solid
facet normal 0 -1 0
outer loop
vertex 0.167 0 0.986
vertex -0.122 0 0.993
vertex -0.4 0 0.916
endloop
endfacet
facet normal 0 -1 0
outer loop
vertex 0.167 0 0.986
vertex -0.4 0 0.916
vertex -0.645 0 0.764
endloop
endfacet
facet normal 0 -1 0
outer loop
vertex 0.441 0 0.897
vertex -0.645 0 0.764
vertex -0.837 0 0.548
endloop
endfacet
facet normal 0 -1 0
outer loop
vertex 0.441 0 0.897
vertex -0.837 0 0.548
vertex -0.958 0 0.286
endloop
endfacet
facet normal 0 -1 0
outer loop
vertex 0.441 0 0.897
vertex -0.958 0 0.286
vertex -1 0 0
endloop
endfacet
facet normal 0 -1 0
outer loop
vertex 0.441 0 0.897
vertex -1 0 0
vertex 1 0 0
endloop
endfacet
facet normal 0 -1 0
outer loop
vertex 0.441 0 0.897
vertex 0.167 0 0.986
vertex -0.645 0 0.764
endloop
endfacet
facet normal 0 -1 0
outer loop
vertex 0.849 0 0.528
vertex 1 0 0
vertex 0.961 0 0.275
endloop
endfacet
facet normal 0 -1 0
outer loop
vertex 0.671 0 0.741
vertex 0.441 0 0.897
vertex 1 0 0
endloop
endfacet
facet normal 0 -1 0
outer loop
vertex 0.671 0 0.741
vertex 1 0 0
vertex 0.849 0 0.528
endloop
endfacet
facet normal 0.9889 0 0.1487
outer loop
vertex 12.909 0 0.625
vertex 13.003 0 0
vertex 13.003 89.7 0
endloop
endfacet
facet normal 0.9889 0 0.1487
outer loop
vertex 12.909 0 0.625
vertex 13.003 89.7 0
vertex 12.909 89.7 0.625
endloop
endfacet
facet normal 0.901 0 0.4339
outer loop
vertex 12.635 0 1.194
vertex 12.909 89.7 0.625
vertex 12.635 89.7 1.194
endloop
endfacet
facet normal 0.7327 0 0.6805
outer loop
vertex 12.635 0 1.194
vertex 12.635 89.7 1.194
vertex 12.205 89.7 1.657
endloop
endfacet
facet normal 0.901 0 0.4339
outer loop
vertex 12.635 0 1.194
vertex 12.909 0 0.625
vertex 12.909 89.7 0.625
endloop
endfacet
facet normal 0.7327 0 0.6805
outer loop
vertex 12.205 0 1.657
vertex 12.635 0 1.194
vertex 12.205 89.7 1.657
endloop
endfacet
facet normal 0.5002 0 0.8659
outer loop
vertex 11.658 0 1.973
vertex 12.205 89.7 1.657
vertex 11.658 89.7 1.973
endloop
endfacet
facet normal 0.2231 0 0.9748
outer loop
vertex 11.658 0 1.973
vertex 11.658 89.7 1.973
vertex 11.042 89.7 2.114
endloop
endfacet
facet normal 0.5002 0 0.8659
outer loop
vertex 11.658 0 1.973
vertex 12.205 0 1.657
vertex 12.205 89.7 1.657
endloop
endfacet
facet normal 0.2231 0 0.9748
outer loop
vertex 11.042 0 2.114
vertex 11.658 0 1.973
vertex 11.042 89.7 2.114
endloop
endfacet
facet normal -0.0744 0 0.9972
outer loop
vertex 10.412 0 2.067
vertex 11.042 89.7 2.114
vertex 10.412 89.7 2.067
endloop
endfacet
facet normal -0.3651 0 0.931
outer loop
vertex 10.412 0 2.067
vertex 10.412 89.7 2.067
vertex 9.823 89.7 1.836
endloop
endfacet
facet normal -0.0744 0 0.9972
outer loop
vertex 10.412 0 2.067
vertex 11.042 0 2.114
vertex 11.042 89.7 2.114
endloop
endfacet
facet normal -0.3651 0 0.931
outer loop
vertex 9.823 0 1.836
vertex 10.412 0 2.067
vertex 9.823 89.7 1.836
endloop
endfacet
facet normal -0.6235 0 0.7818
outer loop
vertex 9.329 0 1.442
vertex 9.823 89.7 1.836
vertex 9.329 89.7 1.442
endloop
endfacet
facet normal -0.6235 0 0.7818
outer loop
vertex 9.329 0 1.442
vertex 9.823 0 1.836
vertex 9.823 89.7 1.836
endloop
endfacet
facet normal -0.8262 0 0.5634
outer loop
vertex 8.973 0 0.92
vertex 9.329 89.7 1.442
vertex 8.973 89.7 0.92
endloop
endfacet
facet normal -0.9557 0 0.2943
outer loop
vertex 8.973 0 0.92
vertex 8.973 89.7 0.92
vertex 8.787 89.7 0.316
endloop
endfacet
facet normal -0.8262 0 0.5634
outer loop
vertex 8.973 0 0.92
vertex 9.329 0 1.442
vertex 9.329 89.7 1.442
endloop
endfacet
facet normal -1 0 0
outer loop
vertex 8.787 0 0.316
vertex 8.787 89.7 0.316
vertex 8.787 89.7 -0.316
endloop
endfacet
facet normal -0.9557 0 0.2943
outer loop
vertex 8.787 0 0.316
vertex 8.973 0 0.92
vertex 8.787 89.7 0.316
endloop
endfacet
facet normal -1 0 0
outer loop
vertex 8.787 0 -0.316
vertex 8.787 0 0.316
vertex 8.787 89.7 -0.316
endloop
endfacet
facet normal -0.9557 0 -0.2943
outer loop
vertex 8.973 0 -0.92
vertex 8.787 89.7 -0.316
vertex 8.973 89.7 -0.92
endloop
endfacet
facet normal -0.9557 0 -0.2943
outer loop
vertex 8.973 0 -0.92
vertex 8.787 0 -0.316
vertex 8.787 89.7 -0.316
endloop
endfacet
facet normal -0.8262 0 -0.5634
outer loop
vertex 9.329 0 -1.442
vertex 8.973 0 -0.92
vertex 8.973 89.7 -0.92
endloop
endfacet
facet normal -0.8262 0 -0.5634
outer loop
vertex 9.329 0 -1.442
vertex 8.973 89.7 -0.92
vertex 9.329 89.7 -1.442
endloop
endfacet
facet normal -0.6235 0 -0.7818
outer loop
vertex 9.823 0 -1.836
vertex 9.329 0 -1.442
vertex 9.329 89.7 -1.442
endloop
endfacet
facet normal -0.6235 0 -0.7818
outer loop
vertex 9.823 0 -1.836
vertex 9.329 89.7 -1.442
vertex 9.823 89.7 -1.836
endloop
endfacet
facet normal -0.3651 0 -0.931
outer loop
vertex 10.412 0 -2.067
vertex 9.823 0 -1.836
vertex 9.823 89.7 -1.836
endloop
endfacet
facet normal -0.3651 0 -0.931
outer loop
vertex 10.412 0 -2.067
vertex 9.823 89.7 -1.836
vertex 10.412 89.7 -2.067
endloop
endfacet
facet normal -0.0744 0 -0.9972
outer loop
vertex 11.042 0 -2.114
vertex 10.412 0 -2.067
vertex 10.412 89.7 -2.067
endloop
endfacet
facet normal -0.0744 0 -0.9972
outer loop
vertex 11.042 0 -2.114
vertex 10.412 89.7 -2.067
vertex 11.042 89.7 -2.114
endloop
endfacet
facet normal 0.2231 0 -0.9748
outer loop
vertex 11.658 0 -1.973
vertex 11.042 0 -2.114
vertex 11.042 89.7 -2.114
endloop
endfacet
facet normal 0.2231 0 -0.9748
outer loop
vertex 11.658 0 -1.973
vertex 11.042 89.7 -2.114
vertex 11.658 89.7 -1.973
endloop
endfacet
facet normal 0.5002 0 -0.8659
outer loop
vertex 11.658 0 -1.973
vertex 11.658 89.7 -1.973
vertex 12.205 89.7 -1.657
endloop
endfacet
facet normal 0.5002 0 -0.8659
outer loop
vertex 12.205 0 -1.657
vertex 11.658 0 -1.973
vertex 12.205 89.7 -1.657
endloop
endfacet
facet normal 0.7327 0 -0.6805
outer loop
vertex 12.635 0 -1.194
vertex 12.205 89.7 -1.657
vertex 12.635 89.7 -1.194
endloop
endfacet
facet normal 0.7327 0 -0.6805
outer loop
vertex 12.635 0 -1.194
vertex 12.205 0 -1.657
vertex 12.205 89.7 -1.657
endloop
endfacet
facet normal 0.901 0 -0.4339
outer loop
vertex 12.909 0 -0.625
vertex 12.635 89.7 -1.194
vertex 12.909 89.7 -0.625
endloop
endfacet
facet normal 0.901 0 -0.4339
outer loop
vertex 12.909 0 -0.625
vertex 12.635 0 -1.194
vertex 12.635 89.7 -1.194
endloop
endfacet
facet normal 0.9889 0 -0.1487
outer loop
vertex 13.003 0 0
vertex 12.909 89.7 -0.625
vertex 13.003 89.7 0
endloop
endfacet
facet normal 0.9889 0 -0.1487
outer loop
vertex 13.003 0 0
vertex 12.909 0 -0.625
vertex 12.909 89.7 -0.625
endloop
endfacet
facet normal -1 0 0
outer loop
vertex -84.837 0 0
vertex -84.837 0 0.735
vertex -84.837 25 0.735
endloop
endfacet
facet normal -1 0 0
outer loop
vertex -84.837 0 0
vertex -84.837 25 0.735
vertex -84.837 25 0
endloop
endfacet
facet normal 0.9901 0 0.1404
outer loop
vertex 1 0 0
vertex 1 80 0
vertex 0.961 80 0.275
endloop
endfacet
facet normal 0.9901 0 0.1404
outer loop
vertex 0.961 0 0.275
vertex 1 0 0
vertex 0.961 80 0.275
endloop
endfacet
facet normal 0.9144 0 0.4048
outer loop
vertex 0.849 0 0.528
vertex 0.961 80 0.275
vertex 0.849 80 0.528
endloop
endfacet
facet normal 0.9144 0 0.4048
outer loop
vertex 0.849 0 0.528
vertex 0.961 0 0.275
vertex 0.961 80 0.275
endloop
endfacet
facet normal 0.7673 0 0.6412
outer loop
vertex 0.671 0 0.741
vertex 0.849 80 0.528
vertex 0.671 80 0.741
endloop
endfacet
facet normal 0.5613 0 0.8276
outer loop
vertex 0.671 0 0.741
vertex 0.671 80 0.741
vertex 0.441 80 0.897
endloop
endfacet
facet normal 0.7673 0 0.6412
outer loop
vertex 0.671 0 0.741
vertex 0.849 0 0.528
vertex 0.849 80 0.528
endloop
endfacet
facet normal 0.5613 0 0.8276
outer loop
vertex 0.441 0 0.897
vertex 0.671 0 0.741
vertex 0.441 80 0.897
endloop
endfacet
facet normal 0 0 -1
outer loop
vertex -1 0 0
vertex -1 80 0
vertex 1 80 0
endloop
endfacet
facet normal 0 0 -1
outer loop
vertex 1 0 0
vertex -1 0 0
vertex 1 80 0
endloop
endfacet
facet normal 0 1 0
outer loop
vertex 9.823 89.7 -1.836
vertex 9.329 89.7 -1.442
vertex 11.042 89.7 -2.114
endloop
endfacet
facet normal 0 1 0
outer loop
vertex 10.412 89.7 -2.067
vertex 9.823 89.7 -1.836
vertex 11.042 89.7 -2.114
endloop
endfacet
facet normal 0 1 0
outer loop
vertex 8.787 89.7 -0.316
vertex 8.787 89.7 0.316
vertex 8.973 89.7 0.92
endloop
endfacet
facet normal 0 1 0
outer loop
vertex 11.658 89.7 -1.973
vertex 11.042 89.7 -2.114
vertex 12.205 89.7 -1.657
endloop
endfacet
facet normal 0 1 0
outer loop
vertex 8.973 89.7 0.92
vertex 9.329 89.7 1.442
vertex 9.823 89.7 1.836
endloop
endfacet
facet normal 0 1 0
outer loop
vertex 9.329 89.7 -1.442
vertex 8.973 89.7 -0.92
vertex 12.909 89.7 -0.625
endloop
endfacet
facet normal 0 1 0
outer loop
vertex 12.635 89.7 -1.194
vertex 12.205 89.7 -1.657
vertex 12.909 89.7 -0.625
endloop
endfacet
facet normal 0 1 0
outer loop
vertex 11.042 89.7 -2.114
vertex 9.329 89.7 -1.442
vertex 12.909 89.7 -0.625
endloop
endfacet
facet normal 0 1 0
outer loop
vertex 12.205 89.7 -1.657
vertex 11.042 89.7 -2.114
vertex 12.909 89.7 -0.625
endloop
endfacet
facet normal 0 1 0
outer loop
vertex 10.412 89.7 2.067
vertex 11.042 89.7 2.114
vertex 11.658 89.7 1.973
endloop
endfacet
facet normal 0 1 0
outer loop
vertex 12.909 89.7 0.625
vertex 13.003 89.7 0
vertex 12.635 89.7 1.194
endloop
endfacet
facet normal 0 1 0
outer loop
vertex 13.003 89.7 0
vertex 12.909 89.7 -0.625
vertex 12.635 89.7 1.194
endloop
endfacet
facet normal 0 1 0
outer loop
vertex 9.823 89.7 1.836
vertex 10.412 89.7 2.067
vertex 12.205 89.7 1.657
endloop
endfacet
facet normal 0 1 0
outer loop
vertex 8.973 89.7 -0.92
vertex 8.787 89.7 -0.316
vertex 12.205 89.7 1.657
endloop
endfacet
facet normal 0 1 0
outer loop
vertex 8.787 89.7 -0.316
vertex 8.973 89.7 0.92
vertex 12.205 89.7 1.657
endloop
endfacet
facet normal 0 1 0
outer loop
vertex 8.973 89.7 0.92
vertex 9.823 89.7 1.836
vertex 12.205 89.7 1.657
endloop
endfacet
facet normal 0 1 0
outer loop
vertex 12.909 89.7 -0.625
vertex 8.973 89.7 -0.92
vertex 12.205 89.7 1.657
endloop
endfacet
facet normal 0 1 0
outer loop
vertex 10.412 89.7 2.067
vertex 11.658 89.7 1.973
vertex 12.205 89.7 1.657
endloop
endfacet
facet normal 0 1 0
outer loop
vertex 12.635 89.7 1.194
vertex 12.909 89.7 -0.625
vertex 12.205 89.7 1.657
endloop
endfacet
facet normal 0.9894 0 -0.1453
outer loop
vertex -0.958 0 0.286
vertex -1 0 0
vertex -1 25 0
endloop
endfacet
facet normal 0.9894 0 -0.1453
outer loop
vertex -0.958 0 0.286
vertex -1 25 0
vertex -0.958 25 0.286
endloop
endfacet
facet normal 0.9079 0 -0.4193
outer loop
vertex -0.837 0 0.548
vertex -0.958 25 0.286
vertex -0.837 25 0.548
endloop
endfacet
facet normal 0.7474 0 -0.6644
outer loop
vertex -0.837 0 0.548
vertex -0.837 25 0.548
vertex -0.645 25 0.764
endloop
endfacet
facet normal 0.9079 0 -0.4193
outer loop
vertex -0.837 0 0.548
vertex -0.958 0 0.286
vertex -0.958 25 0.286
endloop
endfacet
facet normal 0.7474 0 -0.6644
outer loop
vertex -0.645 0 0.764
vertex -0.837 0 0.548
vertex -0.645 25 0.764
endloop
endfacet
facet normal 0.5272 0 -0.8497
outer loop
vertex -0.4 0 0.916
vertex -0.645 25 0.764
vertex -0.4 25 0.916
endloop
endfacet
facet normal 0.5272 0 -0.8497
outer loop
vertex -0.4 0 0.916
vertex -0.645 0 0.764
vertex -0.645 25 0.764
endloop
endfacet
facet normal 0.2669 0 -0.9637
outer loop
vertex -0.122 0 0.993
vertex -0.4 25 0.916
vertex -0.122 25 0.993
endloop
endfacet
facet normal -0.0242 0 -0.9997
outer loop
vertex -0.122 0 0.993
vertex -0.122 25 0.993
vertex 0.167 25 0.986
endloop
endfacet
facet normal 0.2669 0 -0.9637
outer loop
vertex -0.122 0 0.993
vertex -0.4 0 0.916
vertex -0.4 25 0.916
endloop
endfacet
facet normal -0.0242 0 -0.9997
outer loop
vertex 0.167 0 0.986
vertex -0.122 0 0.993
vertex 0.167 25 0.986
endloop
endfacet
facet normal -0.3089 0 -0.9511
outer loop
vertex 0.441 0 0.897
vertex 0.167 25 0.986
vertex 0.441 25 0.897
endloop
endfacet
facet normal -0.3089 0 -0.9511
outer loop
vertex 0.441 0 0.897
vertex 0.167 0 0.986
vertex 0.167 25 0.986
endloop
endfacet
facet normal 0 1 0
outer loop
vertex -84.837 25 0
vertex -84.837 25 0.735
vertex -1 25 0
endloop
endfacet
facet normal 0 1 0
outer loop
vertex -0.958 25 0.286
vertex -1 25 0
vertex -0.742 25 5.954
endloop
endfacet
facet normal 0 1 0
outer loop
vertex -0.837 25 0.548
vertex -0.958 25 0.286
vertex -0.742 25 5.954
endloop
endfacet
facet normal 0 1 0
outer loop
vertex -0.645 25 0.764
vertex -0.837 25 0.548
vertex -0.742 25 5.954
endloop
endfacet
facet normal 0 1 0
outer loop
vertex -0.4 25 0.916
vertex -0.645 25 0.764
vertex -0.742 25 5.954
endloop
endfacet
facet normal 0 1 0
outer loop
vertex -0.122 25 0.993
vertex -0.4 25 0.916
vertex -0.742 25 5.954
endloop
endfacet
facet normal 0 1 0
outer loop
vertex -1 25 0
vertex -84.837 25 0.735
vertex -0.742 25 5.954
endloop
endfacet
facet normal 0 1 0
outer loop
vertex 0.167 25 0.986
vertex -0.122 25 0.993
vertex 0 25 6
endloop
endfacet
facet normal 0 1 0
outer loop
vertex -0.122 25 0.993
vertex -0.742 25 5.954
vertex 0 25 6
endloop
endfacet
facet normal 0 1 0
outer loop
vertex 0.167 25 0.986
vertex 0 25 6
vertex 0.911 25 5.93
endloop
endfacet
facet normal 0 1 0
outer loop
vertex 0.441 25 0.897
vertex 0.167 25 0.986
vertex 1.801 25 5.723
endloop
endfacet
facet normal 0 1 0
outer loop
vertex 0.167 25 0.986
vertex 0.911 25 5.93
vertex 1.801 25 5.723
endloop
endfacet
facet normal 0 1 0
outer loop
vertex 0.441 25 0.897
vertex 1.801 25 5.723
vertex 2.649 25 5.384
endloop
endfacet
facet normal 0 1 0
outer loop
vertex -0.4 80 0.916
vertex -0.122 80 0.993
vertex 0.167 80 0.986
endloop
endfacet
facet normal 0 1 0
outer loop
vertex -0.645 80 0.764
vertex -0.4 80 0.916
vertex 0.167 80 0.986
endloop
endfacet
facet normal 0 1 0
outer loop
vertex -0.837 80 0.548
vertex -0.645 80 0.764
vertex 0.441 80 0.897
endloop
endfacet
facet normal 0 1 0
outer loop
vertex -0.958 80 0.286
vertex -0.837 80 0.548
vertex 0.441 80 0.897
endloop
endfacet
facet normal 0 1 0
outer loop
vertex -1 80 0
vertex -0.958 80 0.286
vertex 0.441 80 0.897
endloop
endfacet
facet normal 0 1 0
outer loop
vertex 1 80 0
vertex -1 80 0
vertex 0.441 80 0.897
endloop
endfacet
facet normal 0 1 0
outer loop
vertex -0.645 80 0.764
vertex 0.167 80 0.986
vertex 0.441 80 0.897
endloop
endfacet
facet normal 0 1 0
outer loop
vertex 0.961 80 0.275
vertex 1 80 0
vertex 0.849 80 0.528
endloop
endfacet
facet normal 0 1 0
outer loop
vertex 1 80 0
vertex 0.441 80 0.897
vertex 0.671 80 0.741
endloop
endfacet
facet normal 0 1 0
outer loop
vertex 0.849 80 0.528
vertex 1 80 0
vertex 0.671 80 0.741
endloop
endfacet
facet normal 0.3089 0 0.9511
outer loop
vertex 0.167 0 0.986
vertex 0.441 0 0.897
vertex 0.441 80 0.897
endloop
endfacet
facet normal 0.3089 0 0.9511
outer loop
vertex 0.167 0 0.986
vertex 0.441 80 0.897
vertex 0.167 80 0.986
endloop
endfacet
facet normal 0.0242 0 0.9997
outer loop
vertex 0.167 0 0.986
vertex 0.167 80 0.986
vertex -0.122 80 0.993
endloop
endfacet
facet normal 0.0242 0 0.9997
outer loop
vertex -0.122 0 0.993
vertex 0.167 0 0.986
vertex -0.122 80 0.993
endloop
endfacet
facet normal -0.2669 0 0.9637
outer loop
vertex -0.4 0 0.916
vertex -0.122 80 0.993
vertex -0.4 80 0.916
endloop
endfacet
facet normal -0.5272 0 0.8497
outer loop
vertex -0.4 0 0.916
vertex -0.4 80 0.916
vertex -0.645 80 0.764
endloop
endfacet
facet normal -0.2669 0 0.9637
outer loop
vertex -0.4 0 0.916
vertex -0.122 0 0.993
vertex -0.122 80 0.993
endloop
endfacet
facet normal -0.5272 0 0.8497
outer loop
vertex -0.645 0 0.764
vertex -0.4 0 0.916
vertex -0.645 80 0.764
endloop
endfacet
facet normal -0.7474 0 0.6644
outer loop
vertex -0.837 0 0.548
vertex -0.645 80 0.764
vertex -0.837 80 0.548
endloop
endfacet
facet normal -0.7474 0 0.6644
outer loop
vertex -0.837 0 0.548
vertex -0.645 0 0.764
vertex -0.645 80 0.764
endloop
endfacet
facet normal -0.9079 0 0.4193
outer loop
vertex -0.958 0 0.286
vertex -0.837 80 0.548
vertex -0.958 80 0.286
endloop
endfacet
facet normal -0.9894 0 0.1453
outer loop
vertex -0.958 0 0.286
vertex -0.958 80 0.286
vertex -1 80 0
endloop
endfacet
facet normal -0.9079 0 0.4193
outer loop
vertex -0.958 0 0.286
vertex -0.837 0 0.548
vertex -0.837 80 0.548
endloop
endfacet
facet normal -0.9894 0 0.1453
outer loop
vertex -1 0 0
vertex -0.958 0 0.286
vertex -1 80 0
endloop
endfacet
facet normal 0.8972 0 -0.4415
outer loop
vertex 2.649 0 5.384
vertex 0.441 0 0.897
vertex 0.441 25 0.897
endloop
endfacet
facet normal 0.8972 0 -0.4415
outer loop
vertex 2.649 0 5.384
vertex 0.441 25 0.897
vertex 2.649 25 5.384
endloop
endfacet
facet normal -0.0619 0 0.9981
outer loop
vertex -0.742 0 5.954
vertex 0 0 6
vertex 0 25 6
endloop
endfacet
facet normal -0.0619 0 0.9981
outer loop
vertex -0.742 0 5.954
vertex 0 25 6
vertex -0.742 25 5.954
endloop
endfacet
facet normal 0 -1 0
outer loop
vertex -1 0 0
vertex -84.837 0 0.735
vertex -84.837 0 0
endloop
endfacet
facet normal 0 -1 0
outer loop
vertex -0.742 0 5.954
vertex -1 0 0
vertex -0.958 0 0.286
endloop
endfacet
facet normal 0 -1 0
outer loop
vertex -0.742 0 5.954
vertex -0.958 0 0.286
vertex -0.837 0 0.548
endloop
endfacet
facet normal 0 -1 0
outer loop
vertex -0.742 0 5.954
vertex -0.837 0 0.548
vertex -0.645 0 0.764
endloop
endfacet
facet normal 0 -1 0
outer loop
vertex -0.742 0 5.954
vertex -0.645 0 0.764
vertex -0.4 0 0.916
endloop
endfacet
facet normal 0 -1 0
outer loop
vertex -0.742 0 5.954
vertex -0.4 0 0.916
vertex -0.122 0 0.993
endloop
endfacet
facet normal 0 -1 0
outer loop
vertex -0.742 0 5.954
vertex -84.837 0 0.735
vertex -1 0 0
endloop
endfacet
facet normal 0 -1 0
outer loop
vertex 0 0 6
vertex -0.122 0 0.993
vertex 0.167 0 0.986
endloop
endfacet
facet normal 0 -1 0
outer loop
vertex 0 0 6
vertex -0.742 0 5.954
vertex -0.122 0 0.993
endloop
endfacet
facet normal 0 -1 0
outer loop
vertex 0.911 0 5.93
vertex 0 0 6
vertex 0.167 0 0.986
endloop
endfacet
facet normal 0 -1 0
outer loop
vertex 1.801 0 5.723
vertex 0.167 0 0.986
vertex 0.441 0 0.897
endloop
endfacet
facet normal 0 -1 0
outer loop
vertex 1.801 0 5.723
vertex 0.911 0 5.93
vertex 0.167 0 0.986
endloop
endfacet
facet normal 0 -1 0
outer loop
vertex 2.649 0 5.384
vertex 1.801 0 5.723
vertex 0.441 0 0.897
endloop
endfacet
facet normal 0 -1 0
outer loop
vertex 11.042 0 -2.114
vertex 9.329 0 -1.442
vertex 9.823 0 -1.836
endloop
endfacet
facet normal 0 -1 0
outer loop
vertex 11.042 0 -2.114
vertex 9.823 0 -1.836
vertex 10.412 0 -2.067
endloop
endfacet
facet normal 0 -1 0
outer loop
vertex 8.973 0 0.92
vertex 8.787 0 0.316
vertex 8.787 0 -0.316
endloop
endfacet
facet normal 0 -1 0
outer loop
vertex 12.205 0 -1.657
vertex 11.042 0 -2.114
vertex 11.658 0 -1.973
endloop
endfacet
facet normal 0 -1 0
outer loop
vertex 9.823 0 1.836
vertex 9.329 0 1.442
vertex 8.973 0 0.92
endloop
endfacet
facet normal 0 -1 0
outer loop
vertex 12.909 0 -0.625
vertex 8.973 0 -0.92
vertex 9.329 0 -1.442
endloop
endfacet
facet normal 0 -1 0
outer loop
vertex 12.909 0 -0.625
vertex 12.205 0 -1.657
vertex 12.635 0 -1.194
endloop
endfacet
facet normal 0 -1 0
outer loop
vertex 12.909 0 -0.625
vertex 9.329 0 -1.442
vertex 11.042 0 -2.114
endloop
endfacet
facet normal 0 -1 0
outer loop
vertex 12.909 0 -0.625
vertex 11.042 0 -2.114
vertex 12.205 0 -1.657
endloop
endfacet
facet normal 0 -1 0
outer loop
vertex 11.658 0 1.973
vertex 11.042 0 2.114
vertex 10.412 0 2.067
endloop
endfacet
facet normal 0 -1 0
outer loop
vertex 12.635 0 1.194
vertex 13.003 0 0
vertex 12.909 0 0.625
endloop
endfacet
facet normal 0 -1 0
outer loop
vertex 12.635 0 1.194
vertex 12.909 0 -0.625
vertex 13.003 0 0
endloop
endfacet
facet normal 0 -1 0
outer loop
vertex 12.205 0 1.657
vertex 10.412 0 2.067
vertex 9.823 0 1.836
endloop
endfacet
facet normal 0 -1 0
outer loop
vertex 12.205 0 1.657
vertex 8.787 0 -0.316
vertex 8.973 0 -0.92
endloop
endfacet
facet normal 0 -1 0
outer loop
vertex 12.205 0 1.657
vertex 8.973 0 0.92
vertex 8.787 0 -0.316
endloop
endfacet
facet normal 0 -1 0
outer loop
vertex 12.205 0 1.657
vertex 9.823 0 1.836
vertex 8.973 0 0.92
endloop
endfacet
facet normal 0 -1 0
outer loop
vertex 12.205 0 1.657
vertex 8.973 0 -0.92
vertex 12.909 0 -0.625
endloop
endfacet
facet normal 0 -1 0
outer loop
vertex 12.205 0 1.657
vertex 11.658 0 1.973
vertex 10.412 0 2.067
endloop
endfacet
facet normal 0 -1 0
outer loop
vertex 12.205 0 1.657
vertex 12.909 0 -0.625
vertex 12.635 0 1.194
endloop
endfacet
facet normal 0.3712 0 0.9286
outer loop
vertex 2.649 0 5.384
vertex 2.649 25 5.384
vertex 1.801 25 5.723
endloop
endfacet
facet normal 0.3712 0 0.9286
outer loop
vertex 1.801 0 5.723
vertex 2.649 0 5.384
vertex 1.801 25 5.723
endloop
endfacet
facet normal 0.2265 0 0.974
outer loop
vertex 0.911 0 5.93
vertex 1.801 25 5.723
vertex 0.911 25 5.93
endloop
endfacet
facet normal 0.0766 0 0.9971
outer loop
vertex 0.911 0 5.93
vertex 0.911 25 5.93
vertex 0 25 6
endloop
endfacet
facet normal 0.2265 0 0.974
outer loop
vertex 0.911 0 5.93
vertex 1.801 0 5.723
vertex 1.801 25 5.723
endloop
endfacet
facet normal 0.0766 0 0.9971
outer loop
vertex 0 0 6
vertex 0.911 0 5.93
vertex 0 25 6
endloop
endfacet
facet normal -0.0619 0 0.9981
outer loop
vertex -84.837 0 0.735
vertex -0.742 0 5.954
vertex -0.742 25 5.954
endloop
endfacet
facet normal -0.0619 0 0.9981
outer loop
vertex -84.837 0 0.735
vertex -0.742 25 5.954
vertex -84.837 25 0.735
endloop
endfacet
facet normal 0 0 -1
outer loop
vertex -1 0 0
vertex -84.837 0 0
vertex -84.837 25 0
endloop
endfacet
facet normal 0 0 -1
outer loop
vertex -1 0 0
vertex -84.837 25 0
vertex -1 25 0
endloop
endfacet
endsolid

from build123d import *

# Parameters (mm, degrees)
F1_DEPTH = 80
F2_R     = 2.12
F3_DEPTH = 89.7
F4_DEPTH = 25


with BuildPart() as f1:
    # F0 (on Front) → F1 (new body)
    with BuildSketch(Plane.XZ):
        with BuildLine():
            Line((0, 0), (0.4414786382, 0.8972717604))
            ThreePointArc((0.4414786382, 0.8972717604), (-0.5284512096, 0.8489636736), (-1, 0))
            Line((-1, 0), (0, 0))
        make_face()
        with BuildLine():
            ThreePointArc((1, 0), (0.8489636736, 0.5284512096), (0.4414786382, 0.8972717604))
            Line((0.4414786382, 0.8972717604), (0, 0))
            Line((0, 0), (1, 0))
        make_face()
    extrude(amount=-F1_DEPTH)


with BuildPart() as f3:
    # F2 (on Front) → F3 (new body)
    with BuildSketch(Plane.XZ):
        with Locations((10.8834160492, 0)):
            Circle(F2_R)
    extrude(amount=-F3_DEPTH)


with BuildPart() as f4:
    # F0 (on Front) → F4 (new body)
    with BuildSketch(Plane.XZ):
        with BuildLine():
            Line((0.4414786382, 0.8972717604), (2.6488718294, 5.3836305623))
            ThreePointArc((2.6488718294, 5.3836305623), (1.3598192208, 5.8438764264), (0, 6))
            Line((0, 6), (-0.7418538472, 5.9539611075))
            Line((-0.7418538472, 5.9539611075), (-84.8367888957, 0.7350926058))
            Line((-84.8367888957, 0.7350926058), (-84.8367888957, 0))
            Line((-84.8367888957, 0), (-1, 0))
            ThreePointArc((-1, 0), (-0.5284512096, 0.8489636736), (0.4414786382, 0.8972717604))
        make_face()
    extrude(amount=-F4_DEPTH)


solid = Compound([f1.part, f3.part, f4.part])
